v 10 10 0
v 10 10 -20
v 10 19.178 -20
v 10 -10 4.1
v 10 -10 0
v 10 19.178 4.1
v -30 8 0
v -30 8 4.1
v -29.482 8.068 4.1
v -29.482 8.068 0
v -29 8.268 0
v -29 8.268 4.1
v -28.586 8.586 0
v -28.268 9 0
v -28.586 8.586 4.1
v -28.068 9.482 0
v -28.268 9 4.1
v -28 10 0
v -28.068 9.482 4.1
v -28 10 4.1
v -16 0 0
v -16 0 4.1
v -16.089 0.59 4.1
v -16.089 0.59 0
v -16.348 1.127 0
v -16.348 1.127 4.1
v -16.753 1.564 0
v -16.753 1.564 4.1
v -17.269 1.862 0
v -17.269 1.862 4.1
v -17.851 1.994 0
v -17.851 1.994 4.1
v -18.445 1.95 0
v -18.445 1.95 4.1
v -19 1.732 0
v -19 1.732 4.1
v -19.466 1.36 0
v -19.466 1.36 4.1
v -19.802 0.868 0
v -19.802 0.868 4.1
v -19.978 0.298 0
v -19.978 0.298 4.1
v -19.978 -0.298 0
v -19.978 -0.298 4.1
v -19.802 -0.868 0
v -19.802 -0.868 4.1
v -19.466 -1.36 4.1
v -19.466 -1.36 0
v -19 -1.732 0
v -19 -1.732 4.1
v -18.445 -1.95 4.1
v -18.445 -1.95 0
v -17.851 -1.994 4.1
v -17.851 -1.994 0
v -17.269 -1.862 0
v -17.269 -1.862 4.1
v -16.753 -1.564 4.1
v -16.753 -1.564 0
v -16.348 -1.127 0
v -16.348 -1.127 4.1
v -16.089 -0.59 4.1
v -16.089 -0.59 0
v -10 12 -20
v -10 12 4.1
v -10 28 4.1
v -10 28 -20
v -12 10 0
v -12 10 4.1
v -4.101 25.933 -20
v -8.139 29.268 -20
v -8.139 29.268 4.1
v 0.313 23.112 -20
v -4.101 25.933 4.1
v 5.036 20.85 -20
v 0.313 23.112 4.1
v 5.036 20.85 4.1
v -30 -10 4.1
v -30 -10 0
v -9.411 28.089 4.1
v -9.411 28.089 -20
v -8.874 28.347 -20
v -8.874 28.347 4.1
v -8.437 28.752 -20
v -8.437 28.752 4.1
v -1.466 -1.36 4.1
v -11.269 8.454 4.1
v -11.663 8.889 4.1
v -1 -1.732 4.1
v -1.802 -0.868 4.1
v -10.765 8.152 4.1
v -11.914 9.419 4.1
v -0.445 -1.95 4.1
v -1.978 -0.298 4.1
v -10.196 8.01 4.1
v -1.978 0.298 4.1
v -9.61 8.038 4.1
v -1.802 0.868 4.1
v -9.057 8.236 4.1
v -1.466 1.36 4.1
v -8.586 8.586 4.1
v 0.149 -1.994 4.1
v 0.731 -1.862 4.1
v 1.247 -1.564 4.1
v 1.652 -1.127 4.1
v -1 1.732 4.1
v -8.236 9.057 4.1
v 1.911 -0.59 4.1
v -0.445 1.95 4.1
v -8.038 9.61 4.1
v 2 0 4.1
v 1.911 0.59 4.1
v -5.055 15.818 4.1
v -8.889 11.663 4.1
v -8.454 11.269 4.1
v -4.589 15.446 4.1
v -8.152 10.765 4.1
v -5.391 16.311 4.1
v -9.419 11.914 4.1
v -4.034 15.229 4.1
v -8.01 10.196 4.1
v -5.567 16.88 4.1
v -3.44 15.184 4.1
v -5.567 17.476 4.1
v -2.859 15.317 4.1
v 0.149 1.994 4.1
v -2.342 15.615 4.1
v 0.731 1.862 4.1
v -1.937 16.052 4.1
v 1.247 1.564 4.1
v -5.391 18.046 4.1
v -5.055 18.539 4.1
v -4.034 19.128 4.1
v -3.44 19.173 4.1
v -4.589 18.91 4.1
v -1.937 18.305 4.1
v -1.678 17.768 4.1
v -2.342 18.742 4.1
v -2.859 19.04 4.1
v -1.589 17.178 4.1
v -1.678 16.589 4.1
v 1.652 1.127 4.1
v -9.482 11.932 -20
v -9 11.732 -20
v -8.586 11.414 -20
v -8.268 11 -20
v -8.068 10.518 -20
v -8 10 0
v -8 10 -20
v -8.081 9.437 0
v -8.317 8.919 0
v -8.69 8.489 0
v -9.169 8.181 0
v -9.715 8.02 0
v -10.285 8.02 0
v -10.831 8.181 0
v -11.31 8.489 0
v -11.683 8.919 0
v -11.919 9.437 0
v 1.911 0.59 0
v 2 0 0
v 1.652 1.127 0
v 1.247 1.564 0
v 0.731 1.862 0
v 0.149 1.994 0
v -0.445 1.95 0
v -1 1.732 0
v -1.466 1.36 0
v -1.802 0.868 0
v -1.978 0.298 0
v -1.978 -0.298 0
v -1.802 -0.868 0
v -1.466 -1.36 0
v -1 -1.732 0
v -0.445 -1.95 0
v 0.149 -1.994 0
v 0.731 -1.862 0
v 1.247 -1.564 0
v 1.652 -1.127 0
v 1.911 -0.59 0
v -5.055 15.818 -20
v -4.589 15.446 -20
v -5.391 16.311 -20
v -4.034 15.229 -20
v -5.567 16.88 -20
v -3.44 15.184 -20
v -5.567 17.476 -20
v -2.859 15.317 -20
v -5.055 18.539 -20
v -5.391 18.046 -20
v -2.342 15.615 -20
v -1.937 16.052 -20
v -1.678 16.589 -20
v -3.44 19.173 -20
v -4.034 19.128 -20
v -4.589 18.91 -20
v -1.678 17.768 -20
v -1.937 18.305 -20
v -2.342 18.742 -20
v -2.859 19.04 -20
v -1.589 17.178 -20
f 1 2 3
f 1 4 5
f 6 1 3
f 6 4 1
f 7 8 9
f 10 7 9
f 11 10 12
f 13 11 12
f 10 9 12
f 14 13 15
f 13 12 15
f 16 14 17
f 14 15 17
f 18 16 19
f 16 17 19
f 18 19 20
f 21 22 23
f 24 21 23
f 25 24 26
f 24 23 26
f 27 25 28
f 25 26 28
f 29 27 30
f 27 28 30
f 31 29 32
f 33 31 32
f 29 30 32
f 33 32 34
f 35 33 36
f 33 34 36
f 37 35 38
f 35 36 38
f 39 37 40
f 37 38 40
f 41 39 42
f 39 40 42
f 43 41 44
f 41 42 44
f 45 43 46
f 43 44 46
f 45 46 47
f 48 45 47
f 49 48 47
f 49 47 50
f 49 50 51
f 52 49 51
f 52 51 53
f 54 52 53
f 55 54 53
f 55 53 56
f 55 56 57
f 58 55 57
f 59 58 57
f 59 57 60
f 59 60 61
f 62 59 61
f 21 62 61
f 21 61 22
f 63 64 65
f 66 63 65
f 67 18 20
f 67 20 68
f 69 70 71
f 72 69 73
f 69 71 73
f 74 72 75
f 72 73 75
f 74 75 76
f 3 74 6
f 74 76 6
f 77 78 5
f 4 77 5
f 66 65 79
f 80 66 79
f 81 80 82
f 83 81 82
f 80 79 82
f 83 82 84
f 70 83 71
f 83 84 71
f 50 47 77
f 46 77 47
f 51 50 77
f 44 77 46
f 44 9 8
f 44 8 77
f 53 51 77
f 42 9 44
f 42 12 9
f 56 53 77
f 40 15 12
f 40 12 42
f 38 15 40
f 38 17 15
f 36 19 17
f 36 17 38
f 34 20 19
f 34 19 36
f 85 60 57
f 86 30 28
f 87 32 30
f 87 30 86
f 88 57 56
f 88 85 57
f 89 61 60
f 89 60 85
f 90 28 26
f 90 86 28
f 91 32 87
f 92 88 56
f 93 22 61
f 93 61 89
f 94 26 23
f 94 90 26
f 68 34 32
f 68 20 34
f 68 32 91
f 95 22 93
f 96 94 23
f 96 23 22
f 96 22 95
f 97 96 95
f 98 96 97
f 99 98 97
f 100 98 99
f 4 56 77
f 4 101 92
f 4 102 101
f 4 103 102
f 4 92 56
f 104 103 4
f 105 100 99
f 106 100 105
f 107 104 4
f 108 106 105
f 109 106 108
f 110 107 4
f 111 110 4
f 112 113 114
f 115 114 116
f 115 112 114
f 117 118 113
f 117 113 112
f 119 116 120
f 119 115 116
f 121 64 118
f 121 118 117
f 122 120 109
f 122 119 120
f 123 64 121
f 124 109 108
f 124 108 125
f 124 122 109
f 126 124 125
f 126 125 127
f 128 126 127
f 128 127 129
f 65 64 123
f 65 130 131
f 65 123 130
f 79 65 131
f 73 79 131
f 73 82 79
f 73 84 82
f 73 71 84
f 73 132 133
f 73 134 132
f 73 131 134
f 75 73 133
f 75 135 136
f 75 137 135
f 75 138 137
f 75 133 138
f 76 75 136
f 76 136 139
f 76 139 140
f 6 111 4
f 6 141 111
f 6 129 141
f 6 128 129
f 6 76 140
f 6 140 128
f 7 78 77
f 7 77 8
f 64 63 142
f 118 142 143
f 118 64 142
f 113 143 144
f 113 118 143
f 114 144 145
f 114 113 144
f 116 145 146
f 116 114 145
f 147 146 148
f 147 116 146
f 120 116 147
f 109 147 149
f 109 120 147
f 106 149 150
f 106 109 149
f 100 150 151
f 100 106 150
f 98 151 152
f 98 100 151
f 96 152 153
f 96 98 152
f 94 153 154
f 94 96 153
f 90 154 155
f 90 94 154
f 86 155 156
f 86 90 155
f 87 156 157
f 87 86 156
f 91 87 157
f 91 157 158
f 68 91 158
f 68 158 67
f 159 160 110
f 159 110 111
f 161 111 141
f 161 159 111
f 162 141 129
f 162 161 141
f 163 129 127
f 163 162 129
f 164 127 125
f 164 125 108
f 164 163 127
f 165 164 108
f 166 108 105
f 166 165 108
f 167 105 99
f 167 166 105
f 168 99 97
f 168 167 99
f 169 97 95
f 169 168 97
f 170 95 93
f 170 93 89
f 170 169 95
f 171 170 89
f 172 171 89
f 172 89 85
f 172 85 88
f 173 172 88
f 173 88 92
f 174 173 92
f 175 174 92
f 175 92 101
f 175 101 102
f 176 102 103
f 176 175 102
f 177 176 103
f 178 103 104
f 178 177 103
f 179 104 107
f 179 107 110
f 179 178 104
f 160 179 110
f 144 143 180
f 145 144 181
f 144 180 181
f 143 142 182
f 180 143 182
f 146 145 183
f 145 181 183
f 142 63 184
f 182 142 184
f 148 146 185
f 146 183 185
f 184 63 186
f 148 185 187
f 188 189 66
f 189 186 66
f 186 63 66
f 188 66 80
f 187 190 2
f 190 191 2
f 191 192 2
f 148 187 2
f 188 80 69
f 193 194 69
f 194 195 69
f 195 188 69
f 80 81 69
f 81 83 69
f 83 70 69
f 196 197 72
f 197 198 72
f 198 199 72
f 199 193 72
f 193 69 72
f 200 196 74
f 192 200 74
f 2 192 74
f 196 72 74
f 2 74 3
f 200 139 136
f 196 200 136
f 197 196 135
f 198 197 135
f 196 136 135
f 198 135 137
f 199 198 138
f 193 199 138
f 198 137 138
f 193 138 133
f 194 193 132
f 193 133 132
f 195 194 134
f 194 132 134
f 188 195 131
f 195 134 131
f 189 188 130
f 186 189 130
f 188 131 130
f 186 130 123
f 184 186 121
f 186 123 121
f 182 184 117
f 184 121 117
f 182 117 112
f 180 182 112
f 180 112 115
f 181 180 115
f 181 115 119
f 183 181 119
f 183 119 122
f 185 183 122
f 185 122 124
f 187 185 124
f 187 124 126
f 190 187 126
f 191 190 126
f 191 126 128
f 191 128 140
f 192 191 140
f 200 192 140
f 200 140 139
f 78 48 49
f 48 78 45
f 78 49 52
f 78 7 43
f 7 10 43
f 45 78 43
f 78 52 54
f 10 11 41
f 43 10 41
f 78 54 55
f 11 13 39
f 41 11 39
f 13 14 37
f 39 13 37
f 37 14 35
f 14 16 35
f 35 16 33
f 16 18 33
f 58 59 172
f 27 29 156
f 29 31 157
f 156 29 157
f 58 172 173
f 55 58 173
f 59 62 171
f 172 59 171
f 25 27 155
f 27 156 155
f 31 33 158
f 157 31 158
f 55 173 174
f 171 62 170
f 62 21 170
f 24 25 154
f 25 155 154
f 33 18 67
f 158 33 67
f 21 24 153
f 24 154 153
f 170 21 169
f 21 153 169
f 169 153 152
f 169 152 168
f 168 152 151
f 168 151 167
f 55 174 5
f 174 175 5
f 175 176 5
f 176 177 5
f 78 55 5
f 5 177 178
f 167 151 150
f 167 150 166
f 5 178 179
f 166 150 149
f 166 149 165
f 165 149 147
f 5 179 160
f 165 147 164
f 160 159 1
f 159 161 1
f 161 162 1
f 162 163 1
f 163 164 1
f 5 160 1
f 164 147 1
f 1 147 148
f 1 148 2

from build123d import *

# Parameters (mm, degrees)
SKETCH_1_W          = 40
SKETCH_1_H          = 20
SKETCH_1_R          = 2
EXTRUDE_1_DEPTH     = 4.1
SKETCH_2_W          = 20
SKETCH_2_H          = 20
EXTRUDE_2_DEPTH     = 24.1
SKETCH_3_R          = 2
CUT_EXTRUDE_1_DEPTH = 49.793544655


with BuildPart() as part:
    # 草图1 → 凸台-拉伸1 (new body)
    with BuildSketch(Plane.XY):
        with Locations((-10, 0)):
            Rectangle(SKETCH_1_W, SKETCH_1_H)
        Circle(SKETCH_1_R, mode=Mode.SUBTRACT)
    extrude(amount=EXTRUDE_1_DEPTH)

    # 草图2 → 凸台-拉伸2 (add)
    with BuildSketch(Plane.XY.offset(4.1)):
        with Locations((0, 20)):
            Rectangle(SKETCH_2_W, SKETCH_2_H)
    extrude(amount=-EXTRUDE_2_DEPTH)

    # 草图3 → 切除-拉伸1 (cut, through all)
    with BuildSketch(Plane.XY.offset(4.1)):
        with Locations((-18, 0)):
            Circle(SKETCH_3_R)
        with Locations((-30, 10)):
            Circle(SKETCH_3_R)
        with Locations((-3.589185504, 17.178371007)):
            Circle(SKETCH_3_R)
        with BuildLine():
            Line((-11.952534179, 30.433140022), (-10, 28))
            ThreePointArc((-10, 28), (-8.873826297, 28.347204553), (-8.138665231, 29.26826721))
            ThreePointArc((-8.138665231, 29.26826721), (0.312733547, 23.112455845), (10, 19.178371007))
            Line((10, 19.178371007), (10, 30))
            Line((10, 30), (-8, 30))
            ThreePointArc((-8, 30), (-9.78213348, 31.988098131), (-11.952534179, 30.433140022))
        make_face()
        with BuildLine():
            Line((-12, 10), (-10, 12))
            ThreePointArc((-10, 12), (-8.585786438, 8.585786438), (-12, 10))
        make_face()
    extrude(amount=-CUT_EXTRUDE_1_DEPTH, mode=Mode.SUBTRACT)


solid = part.part
